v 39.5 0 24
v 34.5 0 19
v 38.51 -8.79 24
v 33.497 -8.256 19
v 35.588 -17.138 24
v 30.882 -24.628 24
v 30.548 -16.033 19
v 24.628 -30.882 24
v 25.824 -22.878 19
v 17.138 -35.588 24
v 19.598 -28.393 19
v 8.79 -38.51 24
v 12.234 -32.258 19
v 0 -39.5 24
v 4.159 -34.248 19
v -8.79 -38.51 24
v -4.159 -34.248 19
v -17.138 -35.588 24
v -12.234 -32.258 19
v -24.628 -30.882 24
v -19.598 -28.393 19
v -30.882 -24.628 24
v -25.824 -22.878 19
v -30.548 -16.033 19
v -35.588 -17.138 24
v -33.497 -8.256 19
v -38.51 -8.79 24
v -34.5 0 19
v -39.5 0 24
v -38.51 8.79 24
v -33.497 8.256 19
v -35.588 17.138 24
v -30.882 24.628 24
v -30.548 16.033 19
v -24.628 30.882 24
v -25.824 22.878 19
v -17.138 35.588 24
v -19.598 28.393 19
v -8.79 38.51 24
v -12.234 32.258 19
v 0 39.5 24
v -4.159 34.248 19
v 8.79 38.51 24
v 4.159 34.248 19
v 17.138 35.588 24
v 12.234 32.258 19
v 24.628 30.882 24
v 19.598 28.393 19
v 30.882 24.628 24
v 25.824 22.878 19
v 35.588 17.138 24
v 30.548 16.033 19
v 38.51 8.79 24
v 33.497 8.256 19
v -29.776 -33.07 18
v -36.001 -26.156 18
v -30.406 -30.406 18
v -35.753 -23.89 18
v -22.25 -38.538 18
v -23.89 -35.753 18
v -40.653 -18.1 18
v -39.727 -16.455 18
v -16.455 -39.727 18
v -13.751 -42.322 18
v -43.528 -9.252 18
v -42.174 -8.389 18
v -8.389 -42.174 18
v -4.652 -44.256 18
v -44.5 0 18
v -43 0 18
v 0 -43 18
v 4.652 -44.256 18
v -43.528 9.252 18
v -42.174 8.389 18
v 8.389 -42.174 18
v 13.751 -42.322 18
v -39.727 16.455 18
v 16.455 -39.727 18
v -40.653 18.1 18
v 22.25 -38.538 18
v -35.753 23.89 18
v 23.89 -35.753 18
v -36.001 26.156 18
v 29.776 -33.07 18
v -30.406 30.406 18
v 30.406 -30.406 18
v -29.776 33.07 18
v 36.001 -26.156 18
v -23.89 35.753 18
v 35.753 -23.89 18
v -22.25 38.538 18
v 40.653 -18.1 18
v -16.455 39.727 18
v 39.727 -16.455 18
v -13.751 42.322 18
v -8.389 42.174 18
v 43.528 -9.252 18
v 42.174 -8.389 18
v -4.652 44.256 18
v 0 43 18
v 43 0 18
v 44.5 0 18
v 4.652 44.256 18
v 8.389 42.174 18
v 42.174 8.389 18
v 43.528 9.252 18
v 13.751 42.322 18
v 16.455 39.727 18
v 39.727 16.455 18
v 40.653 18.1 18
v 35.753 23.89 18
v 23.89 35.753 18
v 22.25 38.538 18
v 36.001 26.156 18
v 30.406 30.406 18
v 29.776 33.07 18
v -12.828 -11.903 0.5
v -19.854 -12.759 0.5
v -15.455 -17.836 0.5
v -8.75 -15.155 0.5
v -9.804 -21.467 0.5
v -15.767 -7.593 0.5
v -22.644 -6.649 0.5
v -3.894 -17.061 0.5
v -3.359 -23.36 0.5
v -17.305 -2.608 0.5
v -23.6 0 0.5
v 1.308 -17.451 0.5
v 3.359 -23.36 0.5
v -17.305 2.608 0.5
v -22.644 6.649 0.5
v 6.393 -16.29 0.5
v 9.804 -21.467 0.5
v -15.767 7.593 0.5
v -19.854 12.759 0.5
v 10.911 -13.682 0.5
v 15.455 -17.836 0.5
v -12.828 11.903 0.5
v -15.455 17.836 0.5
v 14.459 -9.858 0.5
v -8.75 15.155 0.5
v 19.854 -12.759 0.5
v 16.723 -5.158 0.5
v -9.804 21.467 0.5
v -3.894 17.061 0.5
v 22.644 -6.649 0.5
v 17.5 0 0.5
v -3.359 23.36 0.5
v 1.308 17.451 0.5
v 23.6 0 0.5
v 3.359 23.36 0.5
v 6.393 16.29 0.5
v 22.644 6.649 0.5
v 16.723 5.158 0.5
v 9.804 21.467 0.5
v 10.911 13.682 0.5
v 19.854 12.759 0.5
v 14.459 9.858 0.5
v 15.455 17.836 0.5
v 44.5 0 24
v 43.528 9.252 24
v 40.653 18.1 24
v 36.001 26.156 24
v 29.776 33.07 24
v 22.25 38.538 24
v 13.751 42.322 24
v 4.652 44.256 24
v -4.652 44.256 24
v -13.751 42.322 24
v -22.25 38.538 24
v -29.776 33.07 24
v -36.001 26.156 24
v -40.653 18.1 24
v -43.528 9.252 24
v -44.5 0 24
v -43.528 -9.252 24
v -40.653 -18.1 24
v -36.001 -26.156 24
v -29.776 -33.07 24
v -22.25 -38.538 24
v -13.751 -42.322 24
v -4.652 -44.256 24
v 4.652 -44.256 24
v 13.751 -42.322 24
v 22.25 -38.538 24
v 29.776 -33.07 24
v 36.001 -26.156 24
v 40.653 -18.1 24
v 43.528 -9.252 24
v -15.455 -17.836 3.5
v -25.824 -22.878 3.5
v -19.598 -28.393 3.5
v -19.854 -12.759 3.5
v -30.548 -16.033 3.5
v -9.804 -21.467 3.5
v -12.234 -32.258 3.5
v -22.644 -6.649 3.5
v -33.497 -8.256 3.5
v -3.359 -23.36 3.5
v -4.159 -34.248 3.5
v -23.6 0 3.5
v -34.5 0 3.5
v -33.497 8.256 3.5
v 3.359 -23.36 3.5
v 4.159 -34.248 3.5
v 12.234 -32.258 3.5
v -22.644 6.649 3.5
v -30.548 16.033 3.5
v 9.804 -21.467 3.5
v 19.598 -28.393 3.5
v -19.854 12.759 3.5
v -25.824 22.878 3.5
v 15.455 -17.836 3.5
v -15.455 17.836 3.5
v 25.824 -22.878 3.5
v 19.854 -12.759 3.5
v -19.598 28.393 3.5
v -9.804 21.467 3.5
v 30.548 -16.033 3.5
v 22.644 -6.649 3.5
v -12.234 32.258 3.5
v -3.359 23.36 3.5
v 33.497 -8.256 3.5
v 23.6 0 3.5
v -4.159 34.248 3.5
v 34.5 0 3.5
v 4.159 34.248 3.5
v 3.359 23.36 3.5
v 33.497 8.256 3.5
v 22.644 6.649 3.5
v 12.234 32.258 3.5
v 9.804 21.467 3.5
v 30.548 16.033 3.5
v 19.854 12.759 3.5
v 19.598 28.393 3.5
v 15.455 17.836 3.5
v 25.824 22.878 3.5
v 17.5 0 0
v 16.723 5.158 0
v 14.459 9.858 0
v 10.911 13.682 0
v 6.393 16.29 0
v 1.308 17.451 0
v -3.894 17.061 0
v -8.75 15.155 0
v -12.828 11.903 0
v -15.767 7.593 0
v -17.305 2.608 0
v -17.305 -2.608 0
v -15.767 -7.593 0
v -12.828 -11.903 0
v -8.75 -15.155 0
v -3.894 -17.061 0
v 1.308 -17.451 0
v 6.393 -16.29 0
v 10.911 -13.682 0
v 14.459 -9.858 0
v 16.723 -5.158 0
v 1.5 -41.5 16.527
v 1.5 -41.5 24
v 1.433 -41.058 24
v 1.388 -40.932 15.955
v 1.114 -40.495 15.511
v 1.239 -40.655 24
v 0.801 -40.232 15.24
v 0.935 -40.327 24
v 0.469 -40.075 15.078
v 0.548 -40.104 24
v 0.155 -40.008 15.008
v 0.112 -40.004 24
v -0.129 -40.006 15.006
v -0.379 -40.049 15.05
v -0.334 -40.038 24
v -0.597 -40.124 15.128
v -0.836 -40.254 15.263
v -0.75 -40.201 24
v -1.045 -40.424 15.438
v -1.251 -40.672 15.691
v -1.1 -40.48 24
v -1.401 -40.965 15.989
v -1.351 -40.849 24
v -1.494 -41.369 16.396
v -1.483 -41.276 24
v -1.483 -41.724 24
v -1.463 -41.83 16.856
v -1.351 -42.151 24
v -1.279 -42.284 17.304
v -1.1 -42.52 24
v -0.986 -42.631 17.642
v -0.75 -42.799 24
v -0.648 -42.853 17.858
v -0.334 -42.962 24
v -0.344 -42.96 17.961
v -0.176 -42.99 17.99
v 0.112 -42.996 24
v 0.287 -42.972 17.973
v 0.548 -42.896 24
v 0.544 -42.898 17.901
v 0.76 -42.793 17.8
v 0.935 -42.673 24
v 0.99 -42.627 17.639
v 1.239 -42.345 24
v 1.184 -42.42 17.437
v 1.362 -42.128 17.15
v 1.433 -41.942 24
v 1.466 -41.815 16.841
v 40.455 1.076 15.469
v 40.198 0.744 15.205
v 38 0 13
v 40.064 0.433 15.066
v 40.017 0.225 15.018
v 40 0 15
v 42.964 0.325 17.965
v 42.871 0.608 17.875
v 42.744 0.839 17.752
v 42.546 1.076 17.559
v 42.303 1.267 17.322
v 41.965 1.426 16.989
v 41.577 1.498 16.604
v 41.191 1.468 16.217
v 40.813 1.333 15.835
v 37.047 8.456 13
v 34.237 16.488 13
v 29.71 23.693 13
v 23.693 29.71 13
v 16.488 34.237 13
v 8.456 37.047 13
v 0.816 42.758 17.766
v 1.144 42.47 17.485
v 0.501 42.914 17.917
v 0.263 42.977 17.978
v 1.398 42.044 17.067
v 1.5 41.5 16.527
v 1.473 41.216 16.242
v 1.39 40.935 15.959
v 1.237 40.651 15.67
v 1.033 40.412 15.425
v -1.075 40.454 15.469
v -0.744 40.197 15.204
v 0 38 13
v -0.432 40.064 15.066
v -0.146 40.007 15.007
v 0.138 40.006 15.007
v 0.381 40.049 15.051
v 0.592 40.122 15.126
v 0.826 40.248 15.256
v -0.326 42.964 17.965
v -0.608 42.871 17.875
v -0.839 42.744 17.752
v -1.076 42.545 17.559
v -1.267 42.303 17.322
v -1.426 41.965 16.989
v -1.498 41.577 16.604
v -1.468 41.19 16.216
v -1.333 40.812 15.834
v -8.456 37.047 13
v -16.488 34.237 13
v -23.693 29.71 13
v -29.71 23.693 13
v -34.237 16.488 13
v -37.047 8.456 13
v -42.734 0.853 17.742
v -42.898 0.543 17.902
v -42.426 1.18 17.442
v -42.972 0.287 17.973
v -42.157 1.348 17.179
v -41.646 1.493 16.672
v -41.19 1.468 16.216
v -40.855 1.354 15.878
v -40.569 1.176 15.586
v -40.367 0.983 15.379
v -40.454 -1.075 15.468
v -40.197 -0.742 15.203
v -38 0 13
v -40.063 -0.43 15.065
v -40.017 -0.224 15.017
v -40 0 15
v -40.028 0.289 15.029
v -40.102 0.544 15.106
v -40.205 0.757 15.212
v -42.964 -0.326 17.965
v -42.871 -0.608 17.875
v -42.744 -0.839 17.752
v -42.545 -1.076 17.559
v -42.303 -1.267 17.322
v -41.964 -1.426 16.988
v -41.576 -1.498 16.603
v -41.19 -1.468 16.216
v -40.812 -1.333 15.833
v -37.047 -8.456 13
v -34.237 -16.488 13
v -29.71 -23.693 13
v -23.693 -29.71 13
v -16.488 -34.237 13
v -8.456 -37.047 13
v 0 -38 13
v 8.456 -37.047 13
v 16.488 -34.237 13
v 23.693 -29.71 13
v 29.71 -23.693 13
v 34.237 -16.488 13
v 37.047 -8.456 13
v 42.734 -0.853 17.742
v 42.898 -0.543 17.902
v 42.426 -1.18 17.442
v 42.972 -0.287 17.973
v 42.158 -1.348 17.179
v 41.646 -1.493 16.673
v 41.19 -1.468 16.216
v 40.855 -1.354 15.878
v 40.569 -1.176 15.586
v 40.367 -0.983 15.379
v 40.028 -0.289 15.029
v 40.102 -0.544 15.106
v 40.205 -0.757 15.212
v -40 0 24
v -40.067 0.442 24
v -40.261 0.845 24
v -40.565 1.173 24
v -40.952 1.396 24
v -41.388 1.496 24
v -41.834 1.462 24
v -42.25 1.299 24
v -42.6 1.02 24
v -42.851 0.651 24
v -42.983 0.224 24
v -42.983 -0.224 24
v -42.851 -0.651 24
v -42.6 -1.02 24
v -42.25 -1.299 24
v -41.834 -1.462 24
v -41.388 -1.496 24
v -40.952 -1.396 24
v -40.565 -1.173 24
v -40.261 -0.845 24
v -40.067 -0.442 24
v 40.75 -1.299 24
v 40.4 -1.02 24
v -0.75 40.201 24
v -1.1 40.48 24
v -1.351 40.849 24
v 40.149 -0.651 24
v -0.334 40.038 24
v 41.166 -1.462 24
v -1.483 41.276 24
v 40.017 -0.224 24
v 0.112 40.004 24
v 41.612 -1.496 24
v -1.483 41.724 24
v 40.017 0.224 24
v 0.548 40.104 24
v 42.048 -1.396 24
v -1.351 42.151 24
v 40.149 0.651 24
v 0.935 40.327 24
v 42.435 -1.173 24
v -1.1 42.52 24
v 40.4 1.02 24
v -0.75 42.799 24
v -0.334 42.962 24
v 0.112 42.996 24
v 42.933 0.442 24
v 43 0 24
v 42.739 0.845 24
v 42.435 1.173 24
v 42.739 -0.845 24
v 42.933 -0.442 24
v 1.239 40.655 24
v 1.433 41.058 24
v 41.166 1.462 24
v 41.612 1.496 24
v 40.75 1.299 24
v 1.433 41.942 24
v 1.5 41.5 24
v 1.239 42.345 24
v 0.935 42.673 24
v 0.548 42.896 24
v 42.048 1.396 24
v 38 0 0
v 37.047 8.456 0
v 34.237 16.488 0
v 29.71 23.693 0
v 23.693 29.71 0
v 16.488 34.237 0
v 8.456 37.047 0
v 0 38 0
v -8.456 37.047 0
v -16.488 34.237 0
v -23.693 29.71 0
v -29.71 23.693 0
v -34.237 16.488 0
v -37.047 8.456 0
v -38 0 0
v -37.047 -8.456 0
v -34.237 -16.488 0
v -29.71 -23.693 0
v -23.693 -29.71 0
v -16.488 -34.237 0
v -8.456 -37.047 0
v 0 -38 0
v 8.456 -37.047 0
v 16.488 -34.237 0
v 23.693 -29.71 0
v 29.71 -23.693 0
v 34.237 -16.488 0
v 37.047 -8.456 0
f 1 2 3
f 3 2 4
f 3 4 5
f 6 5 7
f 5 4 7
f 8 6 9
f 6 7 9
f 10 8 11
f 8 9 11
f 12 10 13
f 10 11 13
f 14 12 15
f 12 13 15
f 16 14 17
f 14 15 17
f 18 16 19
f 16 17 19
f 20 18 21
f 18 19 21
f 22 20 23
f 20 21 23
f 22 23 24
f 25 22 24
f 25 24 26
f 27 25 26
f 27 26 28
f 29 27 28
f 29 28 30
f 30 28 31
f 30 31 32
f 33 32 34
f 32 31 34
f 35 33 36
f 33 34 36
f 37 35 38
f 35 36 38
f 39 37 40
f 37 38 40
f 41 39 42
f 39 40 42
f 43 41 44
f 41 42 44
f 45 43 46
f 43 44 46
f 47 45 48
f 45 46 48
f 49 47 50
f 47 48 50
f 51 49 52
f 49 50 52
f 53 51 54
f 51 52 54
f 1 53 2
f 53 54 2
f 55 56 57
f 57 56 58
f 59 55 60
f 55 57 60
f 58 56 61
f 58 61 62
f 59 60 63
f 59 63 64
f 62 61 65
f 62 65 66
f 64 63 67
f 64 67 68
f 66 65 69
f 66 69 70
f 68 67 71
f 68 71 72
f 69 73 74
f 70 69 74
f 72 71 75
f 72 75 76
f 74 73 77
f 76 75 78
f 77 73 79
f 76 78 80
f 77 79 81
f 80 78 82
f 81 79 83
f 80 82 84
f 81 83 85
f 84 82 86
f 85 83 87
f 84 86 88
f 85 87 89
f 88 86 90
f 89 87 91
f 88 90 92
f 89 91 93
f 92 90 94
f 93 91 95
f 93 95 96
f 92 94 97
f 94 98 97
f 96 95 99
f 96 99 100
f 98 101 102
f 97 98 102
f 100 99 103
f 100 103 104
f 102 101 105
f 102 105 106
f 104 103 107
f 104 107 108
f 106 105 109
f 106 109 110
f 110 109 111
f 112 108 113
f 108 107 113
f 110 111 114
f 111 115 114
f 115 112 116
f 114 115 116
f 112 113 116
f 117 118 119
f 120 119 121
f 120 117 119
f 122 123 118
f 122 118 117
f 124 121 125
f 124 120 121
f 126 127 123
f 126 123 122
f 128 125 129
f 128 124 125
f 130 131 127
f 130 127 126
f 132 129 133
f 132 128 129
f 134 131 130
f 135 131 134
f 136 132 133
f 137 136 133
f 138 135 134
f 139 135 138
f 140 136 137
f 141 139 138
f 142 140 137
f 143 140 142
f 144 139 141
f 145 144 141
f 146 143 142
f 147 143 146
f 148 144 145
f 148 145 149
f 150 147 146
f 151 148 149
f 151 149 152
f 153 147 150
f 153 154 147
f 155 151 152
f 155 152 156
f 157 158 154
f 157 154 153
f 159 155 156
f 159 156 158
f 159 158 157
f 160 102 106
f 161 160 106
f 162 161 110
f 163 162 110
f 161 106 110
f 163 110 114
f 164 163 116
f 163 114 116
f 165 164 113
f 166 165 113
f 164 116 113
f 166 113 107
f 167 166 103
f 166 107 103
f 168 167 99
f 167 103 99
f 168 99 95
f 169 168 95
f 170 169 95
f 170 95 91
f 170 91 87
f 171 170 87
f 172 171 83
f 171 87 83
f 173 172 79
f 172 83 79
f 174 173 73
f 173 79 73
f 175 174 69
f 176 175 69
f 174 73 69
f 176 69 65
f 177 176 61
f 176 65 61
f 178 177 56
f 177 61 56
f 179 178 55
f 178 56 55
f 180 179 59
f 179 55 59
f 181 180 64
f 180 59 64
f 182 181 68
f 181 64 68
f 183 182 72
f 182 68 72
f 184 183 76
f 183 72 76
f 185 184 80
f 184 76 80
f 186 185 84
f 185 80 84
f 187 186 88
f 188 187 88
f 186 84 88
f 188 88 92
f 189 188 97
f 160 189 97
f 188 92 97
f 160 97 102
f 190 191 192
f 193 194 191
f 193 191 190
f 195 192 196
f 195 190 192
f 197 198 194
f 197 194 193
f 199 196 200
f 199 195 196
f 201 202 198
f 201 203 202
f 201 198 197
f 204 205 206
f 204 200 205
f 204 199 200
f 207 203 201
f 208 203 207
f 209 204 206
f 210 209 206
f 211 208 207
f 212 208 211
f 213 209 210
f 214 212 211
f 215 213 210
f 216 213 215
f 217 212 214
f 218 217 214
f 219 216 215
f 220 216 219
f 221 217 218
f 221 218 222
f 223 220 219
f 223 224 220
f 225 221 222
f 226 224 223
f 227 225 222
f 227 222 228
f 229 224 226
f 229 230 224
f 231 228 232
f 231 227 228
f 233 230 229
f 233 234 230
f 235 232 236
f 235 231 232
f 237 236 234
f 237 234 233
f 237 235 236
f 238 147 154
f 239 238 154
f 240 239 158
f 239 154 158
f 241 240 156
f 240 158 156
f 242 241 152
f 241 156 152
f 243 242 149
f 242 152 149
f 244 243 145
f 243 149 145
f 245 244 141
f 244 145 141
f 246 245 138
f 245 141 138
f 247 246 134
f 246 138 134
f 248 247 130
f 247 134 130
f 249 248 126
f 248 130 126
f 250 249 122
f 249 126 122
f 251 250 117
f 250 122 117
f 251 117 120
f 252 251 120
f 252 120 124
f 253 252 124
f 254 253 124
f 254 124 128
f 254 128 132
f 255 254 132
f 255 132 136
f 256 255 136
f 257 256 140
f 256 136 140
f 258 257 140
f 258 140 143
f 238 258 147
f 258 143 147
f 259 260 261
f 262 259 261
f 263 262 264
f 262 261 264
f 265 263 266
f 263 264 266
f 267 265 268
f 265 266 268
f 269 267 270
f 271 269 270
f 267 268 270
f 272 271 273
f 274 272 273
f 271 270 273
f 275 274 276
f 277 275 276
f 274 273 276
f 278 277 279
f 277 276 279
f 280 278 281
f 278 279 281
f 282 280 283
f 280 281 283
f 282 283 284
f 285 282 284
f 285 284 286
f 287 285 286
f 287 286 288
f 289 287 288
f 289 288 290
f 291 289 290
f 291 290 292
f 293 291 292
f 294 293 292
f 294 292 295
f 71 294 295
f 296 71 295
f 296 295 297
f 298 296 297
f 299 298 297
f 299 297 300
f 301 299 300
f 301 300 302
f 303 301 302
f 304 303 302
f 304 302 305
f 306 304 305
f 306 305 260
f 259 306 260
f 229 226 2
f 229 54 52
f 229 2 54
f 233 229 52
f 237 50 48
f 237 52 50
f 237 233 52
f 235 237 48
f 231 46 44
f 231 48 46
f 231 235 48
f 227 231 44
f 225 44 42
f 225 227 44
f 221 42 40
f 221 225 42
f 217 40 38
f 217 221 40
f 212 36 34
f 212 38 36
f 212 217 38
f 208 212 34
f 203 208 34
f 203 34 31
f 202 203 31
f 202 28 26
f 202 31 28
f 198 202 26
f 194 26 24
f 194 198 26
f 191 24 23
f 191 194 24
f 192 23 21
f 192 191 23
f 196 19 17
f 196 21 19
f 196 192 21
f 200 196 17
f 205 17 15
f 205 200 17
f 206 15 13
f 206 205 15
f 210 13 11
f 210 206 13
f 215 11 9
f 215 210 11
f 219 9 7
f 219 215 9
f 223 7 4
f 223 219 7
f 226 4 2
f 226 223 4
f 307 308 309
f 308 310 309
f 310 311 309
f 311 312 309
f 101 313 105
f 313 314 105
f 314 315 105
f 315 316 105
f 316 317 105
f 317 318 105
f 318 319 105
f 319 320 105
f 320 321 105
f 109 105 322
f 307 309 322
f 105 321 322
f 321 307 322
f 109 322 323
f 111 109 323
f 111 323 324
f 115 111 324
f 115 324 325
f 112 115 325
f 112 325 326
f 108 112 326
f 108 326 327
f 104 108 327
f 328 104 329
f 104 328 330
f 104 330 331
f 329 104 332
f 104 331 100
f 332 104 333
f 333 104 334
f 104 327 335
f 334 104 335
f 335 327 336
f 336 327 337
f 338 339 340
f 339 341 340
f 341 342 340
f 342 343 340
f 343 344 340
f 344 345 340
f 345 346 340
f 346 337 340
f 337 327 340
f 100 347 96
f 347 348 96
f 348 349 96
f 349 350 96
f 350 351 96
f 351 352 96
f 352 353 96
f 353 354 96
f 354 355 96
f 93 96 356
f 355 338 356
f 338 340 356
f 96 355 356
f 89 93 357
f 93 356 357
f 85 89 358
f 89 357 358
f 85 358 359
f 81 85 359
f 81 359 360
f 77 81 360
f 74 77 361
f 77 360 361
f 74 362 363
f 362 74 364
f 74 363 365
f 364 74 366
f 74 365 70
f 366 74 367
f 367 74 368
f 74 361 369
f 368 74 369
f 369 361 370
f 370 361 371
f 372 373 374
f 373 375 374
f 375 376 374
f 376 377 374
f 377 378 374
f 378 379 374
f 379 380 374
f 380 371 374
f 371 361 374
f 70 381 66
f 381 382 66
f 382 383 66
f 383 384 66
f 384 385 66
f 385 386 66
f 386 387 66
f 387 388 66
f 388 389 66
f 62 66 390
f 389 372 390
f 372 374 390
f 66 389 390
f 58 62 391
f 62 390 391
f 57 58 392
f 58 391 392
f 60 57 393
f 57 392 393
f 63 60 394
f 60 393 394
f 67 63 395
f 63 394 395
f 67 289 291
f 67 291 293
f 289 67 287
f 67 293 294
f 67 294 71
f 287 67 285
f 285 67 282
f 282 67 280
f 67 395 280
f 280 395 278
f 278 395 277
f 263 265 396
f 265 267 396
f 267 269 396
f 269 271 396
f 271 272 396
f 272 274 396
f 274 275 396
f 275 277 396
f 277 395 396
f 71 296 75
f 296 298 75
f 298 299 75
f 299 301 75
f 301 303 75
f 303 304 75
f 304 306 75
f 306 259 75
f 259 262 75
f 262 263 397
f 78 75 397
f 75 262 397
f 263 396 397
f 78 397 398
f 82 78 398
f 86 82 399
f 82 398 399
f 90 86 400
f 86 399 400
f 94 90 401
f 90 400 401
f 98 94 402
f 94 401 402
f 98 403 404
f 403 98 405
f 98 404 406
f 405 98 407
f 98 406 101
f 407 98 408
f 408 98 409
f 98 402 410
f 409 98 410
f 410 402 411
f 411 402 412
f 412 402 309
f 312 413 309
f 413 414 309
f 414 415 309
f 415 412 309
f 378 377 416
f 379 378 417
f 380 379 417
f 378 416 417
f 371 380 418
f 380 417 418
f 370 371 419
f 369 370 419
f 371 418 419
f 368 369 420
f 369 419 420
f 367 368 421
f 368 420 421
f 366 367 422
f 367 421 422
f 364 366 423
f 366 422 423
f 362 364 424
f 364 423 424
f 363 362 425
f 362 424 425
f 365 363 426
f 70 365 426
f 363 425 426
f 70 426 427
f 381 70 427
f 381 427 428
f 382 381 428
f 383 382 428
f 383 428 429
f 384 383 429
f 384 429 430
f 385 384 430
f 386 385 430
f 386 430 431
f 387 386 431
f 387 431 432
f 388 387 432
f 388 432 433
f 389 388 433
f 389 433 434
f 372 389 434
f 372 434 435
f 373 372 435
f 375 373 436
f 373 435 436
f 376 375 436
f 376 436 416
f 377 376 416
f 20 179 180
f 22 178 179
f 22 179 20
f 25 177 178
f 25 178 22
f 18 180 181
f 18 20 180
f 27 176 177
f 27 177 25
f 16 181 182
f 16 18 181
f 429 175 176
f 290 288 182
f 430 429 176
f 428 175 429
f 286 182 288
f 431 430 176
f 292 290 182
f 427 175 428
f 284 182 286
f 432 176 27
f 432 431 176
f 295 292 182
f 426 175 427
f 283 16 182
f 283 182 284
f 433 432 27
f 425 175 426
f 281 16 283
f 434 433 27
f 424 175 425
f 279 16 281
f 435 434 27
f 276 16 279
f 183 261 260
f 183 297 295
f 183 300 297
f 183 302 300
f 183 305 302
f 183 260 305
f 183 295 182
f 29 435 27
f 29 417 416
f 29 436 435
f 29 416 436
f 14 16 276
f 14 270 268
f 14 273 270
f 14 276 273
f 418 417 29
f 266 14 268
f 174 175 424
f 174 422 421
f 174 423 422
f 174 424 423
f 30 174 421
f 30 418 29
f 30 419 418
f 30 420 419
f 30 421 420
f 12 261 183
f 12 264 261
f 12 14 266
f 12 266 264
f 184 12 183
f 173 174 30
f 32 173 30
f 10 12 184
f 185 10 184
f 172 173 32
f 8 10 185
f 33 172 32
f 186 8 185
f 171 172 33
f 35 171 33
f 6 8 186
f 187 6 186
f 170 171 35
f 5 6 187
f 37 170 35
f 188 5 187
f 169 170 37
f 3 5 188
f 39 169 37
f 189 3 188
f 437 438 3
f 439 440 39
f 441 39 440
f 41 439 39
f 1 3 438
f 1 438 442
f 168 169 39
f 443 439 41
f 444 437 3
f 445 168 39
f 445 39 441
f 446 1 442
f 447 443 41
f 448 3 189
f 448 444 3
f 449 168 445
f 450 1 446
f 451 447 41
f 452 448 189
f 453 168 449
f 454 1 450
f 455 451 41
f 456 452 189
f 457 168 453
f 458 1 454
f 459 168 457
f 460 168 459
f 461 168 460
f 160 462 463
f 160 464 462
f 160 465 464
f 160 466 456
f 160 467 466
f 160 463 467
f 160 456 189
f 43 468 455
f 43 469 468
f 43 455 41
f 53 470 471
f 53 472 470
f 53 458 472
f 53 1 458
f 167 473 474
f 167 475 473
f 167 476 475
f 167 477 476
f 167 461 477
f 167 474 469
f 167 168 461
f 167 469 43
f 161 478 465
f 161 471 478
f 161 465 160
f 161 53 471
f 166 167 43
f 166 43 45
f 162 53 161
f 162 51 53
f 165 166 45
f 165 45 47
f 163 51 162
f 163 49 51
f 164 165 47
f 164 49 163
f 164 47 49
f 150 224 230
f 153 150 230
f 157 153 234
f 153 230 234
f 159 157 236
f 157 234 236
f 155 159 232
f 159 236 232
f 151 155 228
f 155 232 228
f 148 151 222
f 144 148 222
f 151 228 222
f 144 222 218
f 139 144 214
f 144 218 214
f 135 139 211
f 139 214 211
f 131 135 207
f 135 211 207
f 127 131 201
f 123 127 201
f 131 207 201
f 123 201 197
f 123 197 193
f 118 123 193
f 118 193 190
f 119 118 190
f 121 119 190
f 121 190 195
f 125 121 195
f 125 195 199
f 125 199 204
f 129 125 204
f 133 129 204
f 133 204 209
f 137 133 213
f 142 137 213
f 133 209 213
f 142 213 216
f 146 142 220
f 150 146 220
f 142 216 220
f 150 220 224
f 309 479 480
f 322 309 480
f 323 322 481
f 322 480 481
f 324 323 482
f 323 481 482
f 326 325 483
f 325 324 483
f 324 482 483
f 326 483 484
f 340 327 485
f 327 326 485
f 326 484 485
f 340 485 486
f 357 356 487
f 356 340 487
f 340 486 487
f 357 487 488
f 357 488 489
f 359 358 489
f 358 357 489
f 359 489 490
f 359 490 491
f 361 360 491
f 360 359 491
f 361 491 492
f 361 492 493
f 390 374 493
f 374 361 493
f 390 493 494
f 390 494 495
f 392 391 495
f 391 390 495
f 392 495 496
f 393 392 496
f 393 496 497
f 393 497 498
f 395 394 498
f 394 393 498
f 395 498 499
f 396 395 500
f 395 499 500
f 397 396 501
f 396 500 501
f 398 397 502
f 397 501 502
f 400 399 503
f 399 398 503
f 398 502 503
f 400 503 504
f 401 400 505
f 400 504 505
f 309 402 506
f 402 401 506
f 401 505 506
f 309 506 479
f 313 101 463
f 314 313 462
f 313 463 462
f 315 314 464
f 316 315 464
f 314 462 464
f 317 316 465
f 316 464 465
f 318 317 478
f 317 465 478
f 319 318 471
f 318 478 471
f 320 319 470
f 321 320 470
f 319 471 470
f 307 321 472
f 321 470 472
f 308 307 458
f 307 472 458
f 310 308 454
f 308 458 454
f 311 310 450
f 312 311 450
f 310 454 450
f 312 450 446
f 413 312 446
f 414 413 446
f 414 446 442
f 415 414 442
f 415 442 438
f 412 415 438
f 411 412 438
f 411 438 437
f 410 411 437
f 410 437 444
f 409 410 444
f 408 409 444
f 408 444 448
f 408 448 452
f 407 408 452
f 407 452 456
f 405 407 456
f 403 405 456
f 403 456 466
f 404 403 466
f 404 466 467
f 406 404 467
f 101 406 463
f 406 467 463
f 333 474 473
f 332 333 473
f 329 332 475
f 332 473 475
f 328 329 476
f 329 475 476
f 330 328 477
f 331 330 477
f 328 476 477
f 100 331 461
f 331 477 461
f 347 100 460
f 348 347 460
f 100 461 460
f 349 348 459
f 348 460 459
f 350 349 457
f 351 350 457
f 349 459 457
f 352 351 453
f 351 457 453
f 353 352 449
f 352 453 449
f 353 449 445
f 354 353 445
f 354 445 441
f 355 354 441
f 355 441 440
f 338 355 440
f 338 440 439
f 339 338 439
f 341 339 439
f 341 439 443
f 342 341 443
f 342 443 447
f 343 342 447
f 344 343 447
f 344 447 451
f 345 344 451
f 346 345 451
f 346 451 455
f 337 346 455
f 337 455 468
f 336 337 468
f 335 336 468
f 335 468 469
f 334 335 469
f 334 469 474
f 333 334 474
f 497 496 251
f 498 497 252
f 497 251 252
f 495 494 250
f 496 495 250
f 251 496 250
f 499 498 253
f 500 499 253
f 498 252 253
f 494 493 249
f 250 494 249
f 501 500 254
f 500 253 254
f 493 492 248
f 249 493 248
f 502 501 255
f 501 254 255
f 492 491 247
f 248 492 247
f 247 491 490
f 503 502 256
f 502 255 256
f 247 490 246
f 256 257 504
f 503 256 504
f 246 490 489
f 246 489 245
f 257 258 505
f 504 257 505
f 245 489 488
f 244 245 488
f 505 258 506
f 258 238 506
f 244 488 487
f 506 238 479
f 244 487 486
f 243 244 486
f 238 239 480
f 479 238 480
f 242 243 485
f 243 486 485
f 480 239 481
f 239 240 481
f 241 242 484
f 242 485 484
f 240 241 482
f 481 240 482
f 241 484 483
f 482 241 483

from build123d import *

# Parameters (mm, degrees)
SKETCH1_R           = 38
BOSS_EXTRUDE1_DEPTH = 24
SHELL1_T            = -3.5
SKETCH2_R           = 23.6
CUT_EXTRUDE1_DEPTH  = 3
SKETCH3_R           = 17.5
CUT_EXTRUDE2_DEPTH  = 0.5
BOSS_EXTRUDE2_START = -6
SKETCH4_R           = 44.5
SKETCH4_R_2         = 38
BOSS_EXTRUDE2_DEPTH = 6
SKETCH5_R           = 1.5
CUT_EXTRUDE3_DEPTH  = 6
CHAMFER1_SIZE       = 5


with BuildPart() as part:
    # Sketch1 → Boss-Extrude1 (new body)
    with BuildSketch(Plane.XY):
        Circle(SKETCH1_R)
    extrude(amount=BOSS_EXTRUDE1_DEPTH)

    # Shell1
    shell1_openings = [part.faces().sort_by_distance(p)[0] for p in [
        (0, 0, 24),
    ]]
    offset(amount=SHELL1_T, openings=shell1_openings, kind=Kind.INTERSECTION)

    # Sketch2 → Cut-Extrude1 (cut)
    with BuildSketch(Plane.XY.offset(3.5)):
        Circle(SKETCH2_R)
    extrude(amount=-CUT_EXTRUDE1_DEPTH, mode=Mode.SUBTRACT)

    # Sketch3 → Cut-Extrude2 (cut)
    with BuildSketch(Plane.XY.offset(0.5)):
        Circle(SKETCH3_R)
    extrude(amount=-CUT_EXTRUDE2_DEPTH, mode=Mode.SUBTRACT)

    # Sketch4 → Boss-Extrude2 (add)
    with BuildSketch(Plane.XY.offset(24).offset(BOSS_EXTRUDE2_START)):
        Circle(SKETCH4_R)
        Circle(SKETCH4_R_2, mode=Mode.SUBTRACT)
    extrude(amount=BOSS_EXTRUDE2_DEPTH)

    # Sketch5 → Cut-Extrude3 (cut)
    with BuildSketch(Plane.XY.offset(24)):
        with Locations((0, -41.5)):
            Circle(SKETCH5_R)
        with Locations((-41.5, 0)):
            Circle(SKETCH5_R)
        with Locations((0, 41.5)):
            Circle(SKETCH5_R)
        with Locations((41.5, 0)):
            Circle(SKETCH5_R)
    extrude(amount=-CUT_EXTRUDE3_DEPTH, mode=Mode.SUBTRACT)

    # Chamfer1
    chamfer1_edges = [part.edges().sort_by_distance(p)[0] for p in [
        (-34.5, 0, 24),
    ]]
    chamfer(chamfer1_edges, length=CHAMFER1_SIZE)

    # Chamfer2
    # the kernel refuses this chamfer: 5 mm, written as the material it adds along each edge
    with BuildSketch(Plane(origin=(0, 0, 18), x_dir=(1, 0, 0), z_dir=(0, -1, 0))) as chamfer2_piece_1_section:
        with BuildLine():
            Line((43.141421356, 0.141421356), (37.858578644, -5.141421356))
            Line((37.858578644, -5.141421356), (37.758578644, -5.141421356))
            ThreePointArc((37.758578644, -5.141421356), (37.9, -2.570710678), (37.9, 0))
            Line((37.9, 0), (38, 0.1))
            ThreePointArc((38, 0.1), (40.570710678, 0.1), (43.141421356, 0.241421356))
            Line((43.141421356, 0.241421356), (43.141421356, 0.141421356))
        make_face()
    chamfer2_piece_1 = revolve(axis=Axis((0, 0, 18), (0, 0, 1)), mode=Mode.PRIVATE)
    chamfer2_piece_1 = chamfer2_piece_1 - Plane(origin=(0, -41.5, 17.367076612), x_dir=(1, 0, 0), z_dir=(0, 0, 1)) * Cylinder(1.5, 173, mode=Mode.PRIVATE)
    chamfer2_piece_1 = chamfer2_piece_1 - Plane(origin=(41.5, 0, 17.367076612), x_dir=(1, 0, 0), z_dir=(0, 0, 1)) * Cylinder(1.5, 173, mode=Mode.PRIVATE)
    chamfer2_piece_1 = chamfer2_piece_1 - Plane(origin=(-41.5, 0, 17.367076612), x_dir=(1, 0, 0), z_dir=(0, 0, 1)) * Cylinder(1.5, 173, mode=Mode.PRIVATE)
    chamfer2_piece_1 = chamfer2_piece_1 - Plane(origin=(0, 41.5, 17.367076612), x_dir=(1, 0, 0), z_dir=(0, 0, 1)) * Cylinder(1.5, 173, mode=Mode.PRIVATE)
    add(chamfer2_piece_1)


solid = part.part
